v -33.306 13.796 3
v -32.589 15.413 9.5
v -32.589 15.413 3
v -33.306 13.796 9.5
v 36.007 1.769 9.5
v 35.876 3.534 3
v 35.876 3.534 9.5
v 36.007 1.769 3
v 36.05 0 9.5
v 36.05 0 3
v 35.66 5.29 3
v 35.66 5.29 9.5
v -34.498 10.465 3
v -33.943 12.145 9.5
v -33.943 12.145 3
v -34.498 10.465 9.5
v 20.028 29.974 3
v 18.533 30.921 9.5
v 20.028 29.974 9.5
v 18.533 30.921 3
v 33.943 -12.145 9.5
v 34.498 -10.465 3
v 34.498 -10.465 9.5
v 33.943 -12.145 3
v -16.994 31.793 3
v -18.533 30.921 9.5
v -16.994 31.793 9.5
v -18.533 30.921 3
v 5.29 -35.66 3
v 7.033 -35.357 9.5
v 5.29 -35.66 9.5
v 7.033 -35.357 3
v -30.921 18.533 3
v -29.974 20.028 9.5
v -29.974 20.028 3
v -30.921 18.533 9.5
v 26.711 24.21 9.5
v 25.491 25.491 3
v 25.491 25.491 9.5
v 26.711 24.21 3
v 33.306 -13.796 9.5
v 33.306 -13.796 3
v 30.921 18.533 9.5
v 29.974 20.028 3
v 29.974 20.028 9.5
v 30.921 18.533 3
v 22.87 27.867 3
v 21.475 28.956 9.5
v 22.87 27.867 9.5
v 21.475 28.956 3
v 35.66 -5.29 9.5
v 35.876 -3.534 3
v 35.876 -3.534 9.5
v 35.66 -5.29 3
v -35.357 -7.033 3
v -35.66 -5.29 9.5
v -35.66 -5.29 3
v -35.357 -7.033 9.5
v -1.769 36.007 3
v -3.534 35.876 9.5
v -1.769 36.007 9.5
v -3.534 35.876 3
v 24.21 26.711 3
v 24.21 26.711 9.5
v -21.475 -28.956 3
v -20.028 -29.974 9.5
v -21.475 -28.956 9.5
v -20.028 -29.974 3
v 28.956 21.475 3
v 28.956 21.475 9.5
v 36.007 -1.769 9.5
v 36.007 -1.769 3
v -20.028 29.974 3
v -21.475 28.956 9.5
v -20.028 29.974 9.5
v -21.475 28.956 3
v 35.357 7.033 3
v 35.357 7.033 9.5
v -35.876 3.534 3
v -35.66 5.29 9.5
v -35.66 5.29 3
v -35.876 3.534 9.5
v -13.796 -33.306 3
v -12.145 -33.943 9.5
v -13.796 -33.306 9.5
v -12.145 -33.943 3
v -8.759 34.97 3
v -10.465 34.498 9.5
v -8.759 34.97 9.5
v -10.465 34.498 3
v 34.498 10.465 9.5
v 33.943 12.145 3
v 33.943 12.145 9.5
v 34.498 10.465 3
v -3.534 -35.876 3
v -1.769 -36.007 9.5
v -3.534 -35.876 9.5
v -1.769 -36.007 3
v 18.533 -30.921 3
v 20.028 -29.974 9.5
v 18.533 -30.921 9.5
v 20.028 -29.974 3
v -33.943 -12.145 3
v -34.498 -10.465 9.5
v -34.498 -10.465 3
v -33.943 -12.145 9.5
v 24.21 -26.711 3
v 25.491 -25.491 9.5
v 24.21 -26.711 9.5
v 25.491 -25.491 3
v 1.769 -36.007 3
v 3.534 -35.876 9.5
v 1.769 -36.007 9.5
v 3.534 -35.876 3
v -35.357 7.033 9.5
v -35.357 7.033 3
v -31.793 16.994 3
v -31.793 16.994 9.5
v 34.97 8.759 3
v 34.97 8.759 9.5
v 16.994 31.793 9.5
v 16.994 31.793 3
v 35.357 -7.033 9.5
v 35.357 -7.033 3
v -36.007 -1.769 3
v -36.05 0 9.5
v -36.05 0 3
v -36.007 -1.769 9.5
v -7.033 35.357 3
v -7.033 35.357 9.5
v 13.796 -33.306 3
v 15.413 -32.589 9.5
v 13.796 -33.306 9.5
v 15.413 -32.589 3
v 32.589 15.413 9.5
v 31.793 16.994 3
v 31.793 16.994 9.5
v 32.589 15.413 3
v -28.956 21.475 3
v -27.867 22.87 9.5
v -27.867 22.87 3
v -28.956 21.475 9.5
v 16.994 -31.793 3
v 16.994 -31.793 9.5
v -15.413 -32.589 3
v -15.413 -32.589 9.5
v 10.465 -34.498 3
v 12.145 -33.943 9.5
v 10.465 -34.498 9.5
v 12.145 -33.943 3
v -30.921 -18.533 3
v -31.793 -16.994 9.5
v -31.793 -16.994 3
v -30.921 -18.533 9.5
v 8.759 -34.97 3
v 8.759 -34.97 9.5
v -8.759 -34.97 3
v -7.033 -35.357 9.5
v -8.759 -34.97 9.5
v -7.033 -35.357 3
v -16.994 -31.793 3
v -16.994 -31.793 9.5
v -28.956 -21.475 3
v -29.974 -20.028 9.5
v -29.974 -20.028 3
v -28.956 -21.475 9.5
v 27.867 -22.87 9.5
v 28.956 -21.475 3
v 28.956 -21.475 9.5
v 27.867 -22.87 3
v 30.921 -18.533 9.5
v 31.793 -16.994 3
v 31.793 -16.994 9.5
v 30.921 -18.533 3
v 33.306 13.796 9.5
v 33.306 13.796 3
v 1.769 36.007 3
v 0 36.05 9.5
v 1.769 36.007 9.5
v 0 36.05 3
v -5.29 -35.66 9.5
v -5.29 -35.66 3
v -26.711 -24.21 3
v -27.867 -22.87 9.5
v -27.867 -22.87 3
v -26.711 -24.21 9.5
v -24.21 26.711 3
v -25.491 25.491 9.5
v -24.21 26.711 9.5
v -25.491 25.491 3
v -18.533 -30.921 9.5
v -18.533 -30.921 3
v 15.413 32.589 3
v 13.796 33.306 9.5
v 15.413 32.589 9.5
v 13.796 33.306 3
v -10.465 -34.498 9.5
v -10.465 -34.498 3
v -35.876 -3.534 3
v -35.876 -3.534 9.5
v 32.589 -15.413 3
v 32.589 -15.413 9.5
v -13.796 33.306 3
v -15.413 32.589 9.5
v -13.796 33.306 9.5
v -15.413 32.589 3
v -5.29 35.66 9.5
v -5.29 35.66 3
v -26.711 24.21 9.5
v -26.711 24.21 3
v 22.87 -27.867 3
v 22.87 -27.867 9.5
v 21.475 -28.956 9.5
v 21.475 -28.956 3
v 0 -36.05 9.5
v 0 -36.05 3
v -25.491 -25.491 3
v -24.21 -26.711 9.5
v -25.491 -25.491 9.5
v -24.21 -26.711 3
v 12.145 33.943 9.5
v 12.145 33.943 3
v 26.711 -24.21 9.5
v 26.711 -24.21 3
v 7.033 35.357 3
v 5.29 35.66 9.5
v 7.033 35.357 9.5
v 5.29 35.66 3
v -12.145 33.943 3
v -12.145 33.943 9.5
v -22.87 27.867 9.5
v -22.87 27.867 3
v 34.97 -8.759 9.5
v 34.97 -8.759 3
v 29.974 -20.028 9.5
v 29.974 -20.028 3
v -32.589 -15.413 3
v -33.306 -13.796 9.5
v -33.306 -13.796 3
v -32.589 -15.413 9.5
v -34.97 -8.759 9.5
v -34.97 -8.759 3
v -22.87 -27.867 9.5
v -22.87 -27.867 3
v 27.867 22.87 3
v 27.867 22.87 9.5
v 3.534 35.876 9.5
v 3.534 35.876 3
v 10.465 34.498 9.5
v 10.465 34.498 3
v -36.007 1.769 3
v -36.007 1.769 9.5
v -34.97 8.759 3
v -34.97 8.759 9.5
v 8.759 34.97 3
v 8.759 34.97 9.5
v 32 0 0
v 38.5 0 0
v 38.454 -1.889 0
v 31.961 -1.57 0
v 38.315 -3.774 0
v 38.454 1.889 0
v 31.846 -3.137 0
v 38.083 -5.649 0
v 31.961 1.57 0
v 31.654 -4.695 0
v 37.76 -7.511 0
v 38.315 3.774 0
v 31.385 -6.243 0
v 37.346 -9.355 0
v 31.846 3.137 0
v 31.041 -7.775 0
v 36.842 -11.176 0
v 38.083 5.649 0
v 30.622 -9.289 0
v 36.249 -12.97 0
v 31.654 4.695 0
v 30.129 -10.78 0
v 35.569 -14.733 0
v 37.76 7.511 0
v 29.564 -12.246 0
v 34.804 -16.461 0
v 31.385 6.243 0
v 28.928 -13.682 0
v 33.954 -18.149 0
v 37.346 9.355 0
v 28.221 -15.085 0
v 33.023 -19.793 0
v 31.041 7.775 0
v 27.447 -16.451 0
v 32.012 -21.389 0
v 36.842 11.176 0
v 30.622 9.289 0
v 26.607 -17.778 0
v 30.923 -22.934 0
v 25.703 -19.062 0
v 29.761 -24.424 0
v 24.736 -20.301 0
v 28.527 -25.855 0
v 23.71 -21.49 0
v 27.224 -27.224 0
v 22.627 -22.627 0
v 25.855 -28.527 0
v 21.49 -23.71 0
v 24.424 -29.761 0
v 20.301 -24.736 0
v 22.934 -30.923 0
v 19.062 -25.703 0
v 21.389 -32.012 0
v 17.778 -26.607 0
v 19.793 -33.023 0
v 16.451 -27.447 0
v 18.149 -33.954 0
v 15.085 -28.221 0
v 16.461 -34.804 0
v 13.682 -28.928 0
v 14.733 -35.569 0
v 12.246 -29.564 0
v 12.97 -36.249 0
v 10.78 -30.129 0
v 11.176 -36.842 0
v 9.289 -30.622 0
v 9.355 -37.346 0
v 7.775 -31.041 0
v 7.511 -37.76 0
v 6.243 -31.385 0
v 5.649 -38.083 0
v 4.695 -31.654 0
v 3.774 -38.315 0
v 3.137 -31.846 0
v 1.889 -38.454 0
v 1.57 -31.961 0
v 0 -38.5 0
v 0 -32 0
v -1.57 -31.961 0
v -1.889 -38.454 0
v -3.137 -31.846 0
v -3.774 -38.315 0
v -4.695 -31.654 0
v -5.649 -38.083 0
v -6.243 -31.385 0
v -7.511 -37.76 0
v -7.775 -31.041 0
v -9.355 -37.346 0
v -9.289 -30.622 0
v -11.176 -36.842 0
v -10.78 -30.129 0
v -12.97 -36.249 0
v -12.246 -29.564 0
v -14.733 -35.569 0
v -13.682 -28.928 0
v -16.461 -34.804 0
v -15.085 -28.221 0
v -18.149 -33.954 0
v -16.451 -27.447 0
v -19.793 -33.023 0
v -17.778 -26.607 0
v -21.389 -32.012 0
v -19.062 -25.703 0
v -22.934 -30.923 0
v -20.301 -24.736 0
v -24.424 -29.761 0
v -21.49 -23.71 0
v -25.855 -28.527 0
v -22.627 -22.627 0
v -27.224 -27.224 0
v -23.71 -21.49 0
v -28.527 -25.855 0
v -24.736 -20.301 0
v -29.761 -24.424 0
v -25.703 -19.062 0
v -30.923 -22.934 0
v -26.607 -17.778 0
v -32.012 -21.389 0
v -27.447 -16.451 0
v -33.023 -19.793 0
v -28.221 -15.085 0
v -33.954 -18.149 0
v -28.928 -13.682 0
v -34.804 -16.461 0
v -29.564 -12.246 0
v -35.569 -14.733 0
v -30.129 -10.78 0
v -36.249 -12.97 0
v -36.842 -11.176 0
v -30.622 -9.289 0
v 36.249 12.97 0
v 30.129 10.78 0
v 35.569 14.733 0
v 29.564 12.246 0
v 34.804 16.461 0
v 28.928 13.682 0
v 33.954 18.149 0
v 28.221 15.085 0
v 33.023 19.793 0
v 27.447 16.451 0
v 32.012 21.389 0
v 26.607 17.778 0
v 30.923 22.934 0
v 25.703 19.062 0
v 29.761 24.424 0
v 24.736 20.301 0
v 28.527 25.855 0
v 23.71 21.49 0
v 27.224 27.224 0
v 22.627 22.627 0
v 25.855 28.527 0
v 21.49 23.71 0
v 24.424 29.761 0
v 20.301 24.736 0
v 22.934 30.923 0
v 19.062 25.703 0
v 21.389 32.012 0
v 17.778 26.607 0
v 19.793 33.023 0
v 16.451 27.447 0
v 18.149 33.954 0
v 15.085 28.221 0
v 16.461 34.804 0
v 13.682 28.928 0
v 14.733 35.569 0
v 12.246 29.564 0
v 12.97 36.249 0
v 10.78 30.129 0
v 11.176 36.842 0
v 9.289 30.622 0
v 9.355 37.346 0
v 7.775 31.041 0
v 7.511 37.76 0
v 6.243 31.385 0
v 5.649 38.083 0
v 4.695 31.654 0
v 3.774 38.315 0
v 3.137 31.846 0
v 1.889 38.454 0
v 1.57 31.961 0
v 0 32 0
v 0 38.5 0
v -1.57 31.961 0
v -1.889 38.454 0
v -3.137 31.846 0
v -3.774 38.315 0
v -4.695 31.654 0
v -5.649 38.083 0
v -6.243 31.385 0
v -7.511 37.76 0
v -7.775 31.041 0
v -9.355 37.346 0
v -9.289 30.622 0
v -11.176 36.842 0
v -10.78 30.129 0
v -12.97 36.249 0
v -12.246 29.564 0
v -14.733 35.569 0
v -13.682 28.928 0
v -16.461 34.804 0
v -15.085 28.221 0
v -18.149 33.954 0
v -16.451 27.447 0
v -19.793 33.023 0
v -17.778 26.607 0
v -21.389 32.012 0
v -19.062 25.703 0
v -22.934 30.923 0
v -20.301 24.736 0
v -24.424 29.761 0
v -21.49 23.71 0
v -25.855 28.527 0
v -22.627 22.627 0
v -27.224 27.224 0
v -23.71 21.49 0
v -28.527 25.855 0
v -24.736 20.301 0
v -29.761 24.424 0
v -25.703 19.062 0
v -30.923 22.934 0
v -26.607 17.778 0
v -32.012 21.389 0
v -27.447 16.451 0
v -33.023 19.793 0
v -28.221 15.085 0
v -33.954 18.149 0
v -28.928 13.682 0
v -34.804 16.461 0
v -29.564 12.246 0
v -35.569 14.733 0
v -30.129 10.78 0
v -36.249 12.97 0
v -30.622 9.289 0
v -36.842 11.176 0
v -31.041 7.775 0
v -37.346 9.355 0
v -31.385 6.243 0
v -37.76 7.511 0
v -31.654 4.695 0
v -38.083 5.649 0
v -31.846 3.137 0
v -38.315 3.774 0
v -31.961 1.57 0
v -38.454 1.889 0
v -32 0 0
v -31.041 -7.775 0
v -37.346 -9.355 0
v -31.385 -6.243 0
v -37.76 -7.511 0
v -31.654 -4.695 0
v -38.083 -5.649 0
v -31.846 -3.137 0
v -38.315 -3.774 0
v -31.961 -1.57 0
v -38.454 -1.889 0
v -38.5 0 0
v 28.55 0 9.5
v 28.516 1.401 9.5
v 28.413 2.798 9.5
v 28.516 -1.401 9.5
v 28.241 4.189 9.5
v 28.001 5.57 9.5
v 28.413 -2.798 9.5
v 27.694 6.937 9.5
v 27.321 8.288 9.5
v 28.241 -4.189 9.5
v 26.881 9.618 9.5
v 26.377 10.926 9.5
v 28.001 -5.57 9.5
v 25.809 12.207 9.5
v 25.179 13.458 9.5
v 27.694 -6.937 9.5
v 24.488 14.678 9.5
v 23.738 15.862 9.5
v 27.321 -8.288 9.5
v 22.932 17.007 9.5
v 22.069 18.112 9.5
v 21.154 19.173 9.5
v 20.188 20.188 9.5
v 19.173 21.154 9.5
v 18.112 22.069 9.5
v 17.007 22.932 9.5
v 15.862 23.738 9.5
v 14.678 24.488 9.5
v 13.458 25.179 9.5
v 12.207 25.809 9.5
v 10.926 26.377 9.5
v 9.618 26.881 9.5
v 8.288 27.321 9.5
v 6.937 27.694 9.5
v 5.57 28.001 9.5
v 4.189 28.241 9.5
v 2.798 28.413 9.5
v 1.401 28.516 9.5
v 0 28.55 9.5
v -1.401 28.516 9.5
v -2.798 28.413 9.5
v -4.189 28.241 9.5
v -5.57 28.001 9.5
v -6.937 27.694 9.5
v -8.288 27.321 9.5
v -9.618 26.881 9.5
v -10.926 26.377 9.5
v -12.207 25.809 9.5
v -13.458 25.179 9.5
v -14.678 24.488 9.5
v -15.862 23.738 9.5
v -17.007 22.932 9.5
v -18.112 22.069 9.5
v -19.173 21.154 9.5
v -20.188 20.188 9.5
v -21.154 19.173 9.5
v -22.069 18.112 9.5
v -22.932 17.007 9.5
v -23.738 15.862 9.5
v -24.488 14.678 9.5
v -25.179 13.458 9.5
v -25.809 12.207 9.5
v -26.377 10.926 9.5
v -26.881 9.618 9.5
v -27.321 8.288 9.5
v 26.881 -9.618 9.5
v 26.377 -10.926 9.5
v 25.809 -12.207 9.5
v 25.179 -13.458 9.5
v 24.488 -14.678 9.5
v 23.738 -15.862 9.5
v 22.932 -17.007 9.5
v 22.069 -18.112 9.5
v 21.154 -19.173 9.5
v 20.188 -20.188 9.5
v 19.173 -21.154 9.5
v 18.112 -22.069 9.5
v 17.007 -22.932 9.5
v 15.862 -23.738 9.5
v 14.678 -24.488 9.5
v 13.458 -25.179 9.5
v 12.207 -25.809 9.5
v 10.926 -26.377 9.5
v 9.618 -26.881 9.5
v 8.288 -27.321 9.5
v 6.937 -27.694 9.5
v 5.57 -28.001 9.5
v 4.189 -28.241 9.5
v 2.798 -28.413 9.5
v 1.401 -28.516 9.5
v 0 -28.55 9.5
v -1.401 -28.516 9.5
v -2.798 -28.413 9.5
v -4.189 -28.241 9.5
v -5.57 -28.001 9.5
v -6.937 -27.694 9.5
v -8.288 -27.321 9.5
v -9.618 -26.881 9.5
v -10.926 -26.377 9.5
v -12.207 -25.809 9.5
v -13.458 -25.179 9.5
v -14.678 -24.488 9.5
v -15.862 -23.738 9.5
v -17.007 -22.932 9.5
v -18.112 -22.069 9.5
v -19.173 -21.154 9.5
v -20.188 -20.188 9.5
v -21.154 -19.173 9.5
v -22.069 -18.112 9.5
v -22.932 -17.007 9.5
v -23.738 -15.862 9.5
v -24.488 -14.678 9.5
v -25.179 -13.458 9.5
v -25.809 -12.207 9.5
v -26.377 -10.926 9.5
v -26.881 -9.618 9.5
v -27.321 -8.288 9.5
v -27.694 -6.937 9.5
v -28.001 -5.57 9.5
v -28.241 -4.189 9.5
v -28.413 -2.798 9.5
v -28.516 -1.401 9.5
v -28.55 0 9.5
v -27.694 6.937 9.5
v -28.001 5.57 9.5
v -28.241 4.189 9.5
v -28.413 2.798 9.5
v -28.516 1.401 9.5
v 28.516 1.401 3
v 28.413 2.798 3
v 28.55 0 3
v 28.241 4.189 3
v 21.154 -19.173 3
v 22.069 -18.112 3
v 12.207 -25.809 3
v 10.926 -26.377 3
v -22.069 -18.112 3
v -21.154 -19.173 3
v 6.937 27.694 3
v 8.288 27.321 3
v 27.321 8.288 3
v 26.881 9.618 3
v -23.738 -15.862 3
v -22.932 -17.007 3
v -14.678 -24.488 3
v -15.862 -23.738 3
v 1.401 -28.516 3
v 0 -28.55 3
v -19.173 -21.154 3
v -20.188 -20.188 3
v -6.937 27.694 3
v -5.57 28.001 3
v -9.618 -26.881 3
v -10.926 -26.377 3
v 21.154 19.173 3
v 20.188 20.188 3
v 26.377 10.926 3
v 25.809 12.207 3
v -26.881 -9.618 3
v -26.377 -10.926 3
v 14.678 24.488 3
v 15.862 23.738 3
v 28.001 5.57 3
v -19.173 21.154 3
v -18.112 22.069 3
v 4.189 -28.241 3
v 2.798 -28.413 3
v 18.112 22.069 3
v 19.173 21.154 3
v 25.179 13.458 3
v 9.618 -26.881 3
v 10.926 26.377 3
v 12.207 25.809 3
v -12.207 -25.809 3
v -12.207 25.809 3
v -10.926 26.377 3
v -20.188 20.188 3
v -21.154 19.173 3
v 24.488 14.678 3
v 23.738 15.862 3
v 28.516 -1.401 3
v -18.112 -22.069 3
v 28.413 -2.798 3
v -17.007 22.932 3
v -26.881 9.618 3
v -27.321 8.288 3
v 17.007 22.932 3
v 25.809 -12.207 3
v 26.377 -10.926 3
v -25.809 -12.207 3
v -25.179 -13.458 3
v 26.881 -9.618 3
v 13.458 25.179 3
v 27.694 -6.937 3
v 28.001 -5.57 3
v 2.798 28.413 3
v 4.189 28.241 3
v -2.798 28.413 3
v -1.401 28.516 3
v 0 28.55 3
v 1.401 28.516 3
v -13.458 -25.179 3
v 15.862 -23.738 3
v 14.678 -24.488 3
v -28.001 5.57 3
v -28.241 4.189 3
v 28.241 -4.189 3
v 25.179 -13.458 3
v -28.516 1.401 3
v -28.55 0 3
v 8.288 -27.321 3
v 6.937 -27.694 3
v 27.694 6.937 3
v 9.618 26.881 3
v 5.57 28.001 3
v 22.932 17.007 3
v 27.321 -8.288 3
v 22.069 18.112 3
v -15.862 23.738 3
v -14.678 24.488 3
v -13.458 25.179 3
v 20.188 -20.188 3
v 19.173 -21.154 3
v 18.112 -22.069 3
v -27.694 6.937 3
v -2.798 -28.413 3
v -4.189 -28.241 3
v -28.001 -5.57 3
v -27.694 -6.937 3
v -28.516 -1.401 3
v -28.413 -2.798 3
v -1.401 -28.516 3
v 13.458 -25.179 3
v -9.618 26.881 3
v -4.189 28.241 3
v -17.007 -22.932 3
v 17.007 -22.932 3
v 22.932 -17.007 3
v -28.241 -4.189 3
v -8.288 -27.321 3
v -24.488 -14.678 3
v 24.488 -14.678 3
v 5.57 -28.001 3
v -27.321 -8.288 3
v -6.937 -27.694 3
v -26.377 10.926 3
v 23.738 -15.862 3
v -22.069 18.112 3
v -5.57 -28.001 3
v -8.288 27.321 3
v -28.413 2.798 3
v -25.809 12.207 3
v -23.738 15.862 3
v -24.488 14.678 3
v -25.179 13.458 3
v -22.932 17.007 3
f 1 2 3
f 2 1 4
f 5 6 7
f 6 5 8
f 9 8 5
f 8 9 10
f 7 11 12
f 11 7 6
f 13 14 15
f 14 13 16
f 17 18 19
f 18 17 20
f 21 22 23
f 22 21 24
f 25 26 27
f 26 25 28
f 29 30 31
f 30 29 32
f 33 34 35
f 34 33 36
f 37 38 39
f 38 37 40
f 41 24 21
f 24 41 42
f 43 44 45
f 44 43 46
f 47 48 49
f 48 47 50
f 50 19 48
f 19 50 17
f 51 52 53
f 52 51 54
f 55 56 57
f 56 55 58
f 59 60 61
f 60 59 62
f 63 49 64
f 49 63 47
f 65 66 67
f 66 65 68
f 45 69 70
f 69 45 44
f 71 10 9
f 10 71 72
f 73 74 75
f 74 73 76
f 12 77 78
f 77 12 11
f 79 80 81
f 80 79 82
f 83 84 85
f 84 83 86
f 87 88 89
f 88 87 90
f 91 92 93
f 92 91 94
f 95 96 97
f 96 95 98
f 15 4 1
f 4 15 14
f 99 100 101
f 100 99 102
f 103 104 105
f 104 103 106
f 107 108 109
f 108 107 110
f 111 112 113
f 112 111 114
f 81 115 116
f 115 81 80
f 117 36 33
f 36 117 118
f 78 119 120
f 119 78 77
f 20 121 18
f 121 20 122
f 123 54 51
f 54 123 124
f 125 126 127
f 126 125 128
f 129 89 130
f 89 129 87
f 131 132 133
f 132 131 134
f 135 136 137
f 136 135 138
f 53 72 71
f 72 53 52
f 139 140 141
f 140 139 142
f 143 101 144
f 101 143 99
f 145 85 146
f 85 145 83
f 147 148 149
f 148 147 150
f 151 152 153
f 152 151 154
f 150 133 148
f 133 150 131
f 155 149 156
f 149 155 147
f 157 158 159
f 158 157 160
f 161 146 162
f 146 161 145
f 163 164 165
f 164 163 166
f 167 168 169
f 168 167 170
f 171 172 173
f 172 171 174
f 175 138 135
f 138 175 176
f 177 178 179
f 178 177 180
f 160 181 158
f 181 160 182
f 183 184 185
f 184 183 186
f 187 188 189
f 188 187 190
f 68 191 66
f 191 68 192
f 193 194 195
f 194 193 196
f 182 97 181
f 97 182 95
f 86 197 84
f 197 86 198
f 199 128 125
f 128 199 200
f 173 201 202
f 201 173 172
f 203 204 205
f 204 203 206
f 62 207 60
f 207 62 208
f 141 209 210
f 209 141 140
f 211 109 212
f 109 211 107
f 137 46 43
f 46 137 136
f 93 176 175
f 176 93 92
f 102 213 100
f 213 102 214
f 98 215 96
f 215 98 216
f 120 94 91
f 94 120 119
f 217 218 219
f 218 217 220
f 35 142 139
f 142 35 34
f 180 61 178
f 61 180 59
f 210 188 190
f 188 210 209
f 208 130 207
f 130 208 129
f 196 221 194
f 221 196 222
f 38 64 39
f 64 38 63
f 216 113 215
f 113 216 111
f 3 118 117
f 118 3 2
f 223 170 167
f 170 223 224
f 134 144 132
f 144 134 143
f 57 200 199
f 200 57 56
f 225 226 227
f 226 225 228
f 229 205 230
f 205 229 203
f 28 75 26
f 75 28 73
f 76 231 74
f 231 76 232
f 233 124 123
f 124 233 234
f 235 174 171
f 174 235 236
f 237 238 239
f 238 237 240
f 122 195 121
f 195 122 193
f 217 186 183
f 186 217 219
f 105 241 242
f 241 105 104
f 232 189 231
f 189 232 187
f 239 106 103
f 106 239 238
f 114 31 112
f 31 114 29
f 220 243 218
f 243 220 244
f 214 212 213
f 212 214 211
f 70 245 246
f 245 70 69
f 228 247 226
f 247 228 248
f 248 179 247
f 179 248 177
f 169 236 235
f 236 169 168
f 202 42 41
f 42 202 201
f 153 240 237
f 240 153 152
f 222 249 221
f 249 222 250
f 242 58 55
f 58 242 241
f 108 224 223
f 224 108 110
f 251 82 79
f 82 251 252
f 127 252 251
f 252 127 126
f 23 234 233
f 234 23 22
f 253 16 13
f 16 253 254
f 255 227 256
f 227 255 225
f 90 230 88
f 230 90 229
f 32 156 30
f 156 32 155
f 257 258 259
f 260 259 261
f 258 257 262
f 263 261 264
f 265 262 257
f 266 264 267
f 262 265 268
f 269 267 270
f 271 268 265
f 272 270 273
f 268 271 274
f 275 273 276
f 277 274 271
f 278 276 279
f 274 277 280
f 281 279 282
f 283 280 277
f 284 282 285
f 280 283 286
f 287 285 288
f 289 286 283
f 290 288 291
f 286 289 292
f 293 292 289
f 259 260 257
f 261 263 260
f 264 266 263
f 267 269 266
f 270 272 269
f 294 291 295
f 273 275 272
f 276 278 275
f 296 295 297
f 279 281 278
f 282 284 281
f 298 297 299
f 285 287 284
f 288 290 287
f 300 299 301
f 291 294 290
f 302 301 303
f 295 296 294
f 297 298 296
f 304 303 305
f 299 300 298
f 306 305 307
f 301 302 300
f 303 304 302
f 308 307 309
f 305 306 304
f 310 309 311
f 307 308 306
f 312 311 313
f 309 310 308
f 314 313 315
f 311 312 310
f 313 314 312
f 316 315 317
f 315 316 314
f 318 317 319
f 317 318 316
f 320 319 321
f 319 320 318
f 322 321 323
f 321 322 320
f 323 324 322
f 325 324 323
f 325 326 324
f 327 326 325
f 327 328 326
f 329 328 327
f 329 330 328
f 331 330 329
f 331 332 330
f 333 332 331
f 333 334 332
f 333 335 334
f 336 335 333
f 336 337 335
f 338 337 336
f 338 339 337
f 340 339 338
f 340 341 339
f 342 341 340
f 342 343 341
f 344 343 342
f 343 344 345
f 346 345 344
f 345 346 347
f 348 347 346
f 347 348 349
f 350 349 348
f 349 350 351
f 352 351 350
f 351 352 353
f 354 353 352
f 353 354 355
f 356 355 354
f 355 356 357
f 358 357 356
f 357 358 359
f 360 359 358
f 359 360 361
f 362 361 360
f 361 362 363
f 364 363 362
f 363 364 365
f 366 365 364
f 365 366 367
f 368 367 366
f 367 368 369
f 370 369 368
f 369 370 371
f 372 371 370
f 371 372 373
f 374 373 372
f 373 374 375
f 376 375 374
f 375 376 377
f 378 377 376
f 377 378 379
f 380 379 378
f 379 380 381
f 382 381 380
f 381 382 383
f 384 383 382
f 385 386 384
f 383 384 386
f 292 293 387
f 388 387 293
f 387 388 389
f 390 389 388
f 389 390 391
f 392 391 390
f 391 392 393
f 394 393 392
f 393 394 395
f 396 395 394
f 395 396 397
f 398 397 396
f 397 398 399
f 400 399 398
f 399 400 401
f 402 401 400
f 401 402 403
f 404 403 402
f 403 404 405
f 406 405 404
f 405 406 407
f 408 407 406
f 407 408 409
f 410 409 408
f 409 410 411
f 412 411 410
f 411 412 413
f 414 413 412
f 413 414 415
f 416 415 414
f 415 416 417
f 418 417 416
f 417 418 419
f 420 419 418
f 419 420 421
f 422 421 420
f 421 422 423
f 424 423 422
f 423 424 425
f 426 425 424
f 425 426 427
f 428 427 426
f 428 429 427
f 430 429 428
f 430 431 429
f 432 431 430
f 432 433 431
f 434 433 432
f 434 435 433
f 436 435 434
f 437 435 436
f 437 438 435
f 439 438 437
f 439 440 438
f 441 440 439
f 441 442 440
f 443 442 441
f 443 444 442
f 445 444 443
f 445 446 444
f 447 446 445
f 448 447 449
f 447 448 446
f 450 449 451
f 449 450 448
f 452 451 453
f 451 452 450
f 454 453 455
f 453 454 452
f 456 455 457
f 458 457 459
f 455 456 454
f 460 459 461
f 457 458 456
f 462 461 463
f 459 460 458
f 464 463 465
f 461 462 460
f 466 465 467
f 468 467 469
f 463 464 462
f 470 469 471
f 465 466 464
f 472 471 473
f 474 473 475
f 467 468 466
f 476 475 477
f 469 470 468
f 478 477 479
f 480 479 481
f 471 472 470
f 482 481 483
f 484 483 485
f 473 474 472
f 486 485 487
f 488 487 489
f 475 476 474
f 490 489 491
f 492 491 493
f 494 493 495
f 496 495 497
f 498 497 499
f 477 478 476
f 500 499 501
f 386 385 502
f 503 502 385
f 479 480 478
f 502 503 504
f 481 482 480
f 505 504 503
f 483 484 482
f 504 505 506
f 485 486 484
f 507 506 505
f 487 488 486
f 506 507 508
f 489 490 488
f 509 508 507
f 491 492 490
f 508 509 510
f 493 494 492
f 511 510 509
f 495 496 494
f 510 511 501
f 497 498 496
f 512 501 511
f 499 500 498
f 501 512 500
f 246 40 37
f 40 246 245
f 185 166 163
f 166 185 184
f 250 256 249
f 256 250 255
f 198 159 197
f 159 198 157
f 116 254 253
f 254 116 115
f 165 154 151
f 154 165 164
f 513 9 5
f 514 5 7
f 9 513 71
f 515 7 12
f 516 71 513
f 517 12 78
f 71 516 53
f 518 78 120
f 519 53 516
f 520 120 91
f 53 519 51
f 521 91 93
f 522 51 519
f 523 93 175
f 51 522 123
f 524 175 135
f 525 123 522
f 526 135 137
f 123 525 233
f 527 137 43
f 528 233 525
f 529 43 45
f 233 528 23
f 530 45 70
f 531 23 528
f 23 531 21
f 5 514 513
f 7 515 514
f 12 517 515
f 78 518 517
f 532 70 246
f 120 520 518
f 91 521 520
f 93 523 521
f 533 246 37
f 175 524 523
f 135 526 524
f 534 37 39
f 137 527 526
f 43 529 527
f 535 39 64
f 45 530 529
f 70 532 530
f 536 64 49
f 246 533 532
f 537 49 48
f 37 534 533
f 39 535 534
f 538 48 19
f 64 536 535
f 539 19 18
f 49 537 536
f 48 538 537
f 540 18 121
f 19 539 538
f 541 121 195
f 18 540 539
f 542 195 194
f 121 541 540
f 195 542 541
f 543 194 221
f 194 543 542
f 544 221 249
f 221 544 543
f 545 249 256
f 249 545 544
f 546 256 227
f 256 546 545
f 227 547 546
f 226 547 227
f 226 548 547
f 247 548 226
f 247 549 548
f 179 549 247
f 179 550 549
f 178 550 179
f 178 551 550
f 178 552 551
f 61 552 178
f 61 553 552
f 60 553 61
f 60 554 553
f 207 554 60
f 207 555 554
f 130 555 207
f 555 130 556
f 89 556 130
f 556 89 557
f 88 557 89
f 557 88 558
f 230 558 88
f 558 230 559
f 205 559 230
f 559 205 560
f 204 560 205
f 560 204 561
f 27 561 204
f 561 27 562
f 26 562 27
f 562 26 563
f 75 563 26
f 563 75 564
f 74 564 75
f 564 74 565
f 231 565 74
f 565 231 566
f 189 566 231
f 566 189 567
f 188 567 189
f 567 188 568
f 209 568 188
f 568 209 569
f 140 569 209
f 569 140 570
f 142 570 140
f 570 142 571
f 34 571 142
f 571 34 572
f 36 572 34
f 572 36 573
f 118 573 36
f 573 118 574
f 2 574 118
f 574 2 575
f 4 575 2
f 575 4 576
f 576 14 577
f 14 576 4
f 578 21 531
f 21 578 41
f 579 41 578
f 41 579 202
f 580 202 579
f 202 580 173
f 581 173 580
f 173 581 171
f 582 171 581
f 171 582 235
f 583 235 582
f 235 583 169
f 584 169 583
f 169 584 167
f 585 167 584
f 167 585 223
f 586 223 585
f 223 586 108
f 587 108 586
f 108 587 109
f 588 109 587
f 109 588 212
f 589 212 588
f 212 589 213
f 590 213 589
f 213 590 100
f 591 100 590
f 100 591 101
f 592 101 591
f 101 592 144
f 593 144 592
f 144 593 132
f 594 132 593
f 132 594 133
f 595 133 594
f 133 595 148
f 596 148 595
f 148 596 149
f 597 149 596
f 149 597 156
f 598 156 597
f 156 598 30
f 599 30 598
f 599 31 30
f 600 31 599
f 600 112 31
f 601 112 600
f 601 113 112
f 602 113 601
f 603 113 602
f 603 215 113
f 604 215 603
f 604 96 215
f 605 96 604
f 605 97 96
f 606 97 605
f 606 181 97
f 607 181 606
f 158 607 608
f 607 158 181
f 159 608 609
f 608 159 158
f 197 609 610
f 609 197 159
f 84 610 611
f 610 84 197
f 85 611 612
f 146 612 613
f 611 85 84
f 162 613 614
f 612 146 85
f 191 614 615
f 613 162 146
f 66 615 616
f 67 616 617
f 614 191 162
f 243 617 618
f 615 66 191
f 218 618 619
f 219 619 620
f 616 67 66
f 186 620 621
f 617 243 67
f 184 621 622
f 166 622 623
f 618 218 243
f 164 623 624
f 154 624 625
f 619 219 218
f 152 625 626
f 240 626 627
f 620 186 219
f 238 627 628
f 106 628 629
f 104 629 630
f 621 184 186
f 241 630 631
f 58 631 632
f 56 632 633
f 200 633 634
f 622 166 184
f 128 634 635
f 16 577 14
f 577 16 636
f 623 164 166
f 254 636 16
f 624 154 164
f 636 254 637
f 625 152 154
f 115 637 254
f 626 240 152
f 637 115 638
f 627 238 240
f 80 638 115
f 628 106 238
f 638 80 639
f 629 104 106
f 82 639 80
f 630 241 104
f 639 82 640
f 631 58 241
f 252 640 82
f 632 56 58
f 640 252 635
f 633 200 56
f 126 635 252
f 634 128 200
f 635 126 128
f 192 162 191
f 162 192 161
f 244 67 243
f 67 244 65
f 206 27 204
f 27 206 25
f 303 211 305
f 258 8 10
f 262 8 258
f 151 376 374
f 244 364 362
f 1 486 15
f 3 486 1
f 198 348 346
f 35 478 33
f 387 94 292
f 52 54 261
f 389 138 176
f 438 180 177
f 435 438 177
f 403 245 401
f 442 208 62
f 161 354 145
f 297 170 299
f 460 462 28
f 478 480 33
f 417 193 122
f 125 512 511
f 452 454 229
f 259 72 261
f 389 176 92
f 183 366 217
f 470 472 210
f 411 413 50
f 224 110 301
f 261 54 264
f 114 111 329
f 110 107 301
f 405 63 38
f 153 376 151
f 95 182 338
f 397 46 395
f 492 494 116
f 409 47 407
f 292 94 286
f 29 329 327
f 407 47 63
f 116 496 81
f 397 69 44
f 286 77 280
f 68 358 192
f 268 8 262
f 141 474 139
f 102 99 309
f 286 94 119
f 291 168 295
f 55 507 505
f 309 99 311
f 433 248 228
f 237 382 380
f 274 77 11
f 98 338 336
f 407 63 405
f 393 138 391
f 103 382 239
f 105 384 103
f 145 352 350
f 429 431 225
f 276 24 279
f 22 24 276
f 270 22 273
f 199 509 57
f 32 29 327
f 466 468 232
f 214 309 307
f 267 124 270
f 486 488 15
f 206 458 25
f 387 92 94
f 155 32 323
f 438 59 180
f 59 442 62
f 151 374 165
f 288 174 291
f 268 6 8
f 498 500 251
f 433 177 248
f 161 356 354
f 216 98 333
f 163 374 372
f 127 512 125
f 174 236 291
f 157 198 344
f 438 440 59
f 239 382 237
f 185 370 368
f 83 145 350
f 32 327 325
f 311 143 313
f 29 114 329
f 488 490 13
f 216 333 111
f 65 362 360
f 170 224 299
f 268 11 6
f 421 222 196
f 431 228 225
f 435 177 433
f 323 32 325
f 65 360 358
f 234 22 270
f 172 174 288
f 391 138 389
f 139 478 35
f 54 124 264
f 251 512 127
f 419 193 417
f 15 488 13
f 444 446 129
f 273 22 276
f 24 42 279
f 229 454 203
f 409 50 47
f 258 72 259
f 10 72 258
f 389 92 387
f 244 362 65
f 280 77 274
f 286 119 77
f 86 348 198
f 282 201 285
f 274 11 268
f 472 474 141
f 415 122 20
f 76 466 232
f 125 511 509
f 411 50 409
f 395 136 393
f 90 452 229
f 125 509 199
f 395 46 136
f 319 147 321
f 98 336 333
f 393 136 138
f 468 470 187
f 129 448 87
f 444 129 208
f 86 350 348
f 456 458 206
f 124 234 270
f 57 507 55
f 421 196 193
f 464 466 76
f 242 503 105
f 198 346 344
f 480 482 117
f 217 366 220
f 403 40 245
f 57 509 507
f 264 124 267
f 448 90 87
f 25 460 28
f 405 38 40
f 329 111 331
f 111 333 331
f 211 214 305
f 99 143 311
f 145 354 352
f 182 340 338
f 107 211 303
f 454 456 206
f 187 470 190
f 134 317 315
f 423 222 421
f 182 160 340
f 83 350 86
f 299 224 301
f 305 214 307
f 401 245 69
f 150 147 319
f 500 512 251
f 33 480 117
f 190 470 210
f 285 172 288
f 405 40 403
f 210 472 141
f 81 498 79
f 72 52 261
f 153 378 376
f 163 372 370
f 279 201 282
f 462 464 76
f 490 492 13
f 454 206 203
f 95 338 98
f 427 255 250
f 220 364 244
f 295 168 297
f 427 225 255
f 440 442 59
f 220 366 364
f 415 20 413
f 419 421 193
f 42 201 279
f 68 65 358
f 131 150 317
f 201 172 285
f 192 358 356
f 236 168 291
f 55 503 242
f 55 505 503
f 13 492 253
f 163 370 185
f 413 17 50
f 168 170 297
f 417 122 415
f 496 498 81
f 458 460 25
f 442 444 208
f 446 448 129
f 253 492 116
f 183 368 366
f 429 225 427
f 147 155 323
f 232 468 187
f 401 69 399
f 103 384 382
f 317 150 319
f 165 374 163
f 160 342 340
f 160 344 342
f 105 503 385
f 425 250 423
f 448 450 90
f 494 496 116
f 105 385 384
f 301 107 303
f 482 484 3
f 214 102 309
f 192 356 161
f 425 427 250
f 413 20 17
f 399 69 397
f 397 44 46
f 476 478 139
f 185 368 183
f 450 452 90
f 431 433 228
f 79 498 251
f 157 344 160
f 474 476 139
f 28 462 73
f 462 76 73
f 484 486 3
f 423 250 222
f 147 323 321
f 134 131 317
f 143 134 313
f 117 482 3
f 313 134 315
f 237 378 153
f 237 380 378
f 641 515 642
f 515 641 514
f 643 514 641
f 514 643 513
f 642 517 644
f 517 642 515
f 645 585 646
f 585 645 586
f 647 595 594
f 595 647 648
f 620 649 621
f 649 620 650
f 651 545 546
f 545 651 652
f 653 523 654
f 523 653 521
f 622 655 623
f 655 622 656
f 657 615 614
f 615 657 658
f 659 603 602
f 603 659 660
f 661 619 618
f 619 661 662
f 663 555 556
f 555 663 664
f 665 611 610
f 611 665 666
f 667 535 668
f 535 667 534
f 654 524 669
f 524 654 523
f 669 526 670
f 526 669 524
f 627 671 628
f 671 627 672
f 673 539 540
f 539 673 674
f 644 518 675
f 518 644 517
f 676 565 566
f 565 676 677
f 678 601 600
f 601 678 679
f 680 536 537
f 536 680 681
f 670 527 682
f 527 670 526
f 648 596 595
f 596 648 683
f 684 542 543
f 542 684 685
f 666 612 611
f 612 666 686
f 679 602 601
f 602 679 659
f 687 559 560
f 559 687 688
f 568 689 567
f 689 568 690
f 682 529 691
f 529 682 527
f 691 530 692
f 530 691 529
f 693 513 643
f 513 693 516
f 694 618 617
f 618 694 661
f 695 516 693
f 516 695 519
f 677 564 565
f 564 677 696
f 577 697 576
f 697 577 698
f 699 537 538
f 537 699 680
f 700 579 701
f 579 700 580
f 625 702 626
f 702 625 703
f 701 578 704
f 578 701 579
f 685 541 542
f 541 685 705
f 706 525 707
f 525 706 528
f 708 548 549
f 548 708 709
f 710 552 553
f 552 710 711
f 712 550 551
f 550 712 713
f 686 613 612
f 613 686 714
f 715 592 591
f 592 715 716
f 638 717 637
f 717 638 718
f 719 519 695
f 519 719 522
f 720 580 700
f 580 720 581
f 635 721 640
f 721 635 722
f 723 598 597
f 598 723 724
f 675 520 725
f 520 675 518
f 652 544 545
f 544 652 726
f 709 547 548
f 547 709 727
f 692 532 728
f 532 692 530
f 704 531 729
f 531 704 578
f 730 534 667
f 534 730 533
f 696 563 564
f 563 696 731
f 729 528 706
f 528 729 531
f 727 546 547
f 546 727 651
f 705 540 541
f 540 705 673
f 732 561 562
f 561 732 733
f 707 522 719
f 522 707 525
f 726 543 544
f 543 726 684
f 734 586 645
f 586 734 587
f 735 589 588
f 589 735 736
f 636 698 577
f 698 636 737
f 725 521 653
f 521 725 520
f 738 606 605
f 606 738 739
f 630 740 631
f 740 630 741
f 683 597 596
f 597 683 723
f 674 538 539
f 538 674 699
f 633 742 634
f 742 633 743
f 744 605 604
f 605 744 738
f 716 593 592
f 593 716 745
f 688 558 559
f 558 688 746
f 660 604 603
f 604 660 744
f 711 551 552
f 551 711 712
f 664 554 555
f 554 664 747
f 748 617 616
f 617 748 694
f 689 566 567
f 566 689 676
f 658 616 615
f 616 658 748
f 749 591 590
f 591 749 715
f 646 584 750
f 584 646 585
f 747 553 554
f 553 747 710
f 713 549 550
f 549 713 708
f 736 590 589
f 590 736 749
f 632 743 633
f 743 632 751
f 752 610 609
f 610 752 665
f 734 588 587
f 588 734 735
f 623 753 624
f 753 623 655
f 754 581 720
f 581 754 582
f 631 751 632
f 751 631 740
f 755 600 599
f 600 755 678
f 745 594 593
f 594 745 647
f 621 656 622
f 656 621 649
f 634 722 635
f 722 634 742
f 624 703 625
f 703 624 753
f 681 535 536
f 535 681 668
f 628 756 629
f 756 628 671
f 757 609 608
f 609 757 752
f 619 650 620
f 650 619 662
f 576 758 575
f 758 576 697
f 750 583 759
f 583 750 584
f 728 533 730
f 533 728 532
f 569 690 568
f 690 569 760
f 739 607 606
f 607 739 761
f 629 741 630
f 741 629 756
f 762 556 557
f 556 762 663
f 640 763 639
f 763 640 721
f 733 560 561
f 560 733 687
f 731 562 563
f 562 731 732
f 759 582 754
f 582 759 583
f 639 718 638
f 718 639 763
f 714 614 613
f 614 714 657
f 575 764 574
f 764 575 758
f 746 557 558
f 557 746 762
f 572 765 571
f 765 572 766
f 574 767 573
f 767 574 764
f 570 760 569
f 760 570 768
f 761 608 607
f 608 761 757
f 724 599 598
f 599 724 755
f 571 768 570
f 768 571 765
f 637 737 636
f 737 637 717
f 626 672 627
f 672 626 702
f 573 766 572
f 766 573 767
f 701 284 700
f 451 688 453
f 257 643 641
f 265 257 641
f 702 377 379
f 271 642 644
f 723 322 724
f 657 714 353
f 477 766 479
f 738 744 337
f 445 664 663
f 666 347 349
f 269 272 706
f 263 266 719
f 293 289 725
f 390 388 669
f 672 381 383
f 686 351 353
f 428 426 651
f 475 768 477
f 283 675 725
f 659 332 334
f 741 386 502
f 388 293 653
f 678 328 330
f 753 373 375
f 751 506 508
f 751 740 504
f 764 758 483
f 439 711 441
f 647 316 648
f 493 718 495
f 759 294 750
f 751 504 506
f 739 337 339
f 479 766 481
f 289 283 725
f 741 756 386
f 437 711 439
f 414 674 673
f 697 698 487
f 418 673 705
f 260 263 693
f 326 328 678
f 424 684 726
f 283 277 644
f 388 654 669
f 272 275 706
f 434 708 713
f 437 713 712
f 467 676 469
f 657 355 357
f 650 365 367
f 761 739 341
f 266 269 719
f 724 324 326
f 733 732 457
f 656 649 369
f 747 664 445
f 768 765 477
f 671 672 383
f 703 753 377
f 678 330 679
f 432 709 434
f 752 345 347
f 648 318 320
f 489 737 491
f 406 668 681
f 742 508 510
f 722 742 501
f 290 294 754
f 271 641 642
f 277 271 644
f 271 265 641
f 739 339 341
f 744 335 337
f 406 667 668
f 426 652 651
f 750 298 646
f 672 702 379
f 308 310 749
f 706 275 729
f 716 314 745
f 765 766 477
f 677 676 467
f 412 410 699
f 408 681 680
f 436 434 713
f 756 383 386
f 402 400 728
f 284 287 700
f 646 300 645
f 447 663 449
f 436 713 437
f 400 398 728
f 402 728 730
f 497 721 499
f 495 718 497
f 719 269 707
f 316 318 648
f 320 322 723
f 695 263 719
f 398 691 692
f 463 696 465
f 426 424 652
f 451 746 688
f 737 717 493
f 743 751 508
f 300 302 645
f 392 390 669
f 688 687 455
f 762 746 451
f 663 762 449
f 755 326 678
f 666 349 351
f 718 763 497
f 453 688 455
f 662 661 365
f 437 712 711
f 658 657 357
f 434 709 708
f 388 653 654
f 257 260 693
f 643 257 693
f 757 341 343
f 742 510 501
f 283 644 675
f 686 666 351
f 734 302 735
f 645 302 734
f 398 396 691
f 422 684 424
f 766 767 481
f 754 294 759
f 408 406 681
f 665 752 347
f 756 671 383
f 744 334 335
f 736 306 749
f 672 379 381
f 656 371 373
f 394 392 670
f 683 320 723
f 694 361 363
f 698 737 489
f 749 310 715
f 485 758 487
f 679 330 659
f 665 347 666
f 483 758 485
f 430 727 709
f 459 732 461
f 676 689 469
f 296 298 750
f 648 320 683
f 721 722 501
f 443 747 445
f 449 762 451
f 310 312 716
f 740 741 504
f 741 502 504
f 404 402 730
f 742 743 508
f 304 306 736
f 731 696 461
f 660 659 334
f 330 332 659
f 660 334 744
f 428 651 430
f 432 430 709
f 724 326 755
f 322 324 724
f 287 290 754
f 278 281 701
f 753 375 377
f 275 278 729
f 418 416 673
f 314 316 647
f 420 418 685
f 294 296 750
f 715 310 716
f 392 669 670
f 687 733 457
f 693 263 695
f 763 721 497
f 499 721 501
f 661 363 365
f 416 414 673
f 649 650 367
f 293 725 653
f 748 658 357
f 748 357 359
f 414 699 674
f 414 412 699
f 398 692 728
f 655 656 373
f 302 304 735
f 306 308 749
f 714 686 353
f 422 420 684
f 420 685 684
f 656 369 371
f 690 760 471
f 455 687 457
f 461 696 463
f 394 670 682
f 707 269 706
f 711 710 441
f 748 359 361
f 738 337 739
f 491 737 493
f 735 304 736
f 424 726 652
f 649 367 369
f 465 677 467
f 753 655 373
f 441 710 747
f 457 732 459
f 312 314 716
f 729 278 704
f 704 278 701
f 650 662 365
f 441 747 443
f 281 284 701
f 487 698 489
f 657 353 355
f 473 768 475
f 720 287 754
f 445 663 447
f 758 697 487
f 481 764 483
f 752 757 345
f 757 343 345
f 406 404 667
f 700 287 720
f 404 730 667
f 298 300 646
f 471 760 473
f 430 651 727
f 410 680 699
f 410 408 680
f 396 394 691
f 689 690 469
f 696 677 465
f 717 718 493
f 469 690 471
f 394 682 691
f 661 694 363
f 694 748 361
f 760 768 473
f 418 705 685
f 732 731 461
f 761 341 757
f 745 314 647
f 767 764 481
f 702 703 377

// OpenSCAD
// [FL_INDEX: keywords="openscad, 3d_parametric, Wheel_Spacer_For_Custom_Rims_Customizer, csg_solid" | COT="Parametric OpenSCAD design from 3DCodeverse"]
// Title: Wheel Spacer For Custom Rims Customizer

// Outer Diameter
    OD = 72.1;
// Inner Diameter
    ID = 57.1;
// Taper's Outer Diameter
    Taper_OD = 77;
// Taper's Inner Diameter
    Taper_InnerD = 64;
// Overall Thickness
    Thickness = 9.5;
// Taper Thickness
    Taper_Thickness = 3;


module WheelSpacer (OD, ID, Taper_OD, Taper_InnerD, Thickness, Taper_Thickness)
{
difference()
{
	union()
	{
		cylinder(h = Thickness, r = OD/2, $fn= 128);
		cylinder(h = Taper_Thickness, r1 = Taper_OD/2, r2= OD/2, $fn = 128);
	}
	translate([0,0,-0.5]) cylinder(h = Thickness+1, r = ID/2, $fn = 128);
	cylinder(h = Taper_Thickness, r1 = Taper_InnerD/2, r2 = ID/2, $fn = 128);
}


}







WheelSpacer(OD, ID, Taper_OD, Taper_InnerD, Thickness, Taper_Thickness);
